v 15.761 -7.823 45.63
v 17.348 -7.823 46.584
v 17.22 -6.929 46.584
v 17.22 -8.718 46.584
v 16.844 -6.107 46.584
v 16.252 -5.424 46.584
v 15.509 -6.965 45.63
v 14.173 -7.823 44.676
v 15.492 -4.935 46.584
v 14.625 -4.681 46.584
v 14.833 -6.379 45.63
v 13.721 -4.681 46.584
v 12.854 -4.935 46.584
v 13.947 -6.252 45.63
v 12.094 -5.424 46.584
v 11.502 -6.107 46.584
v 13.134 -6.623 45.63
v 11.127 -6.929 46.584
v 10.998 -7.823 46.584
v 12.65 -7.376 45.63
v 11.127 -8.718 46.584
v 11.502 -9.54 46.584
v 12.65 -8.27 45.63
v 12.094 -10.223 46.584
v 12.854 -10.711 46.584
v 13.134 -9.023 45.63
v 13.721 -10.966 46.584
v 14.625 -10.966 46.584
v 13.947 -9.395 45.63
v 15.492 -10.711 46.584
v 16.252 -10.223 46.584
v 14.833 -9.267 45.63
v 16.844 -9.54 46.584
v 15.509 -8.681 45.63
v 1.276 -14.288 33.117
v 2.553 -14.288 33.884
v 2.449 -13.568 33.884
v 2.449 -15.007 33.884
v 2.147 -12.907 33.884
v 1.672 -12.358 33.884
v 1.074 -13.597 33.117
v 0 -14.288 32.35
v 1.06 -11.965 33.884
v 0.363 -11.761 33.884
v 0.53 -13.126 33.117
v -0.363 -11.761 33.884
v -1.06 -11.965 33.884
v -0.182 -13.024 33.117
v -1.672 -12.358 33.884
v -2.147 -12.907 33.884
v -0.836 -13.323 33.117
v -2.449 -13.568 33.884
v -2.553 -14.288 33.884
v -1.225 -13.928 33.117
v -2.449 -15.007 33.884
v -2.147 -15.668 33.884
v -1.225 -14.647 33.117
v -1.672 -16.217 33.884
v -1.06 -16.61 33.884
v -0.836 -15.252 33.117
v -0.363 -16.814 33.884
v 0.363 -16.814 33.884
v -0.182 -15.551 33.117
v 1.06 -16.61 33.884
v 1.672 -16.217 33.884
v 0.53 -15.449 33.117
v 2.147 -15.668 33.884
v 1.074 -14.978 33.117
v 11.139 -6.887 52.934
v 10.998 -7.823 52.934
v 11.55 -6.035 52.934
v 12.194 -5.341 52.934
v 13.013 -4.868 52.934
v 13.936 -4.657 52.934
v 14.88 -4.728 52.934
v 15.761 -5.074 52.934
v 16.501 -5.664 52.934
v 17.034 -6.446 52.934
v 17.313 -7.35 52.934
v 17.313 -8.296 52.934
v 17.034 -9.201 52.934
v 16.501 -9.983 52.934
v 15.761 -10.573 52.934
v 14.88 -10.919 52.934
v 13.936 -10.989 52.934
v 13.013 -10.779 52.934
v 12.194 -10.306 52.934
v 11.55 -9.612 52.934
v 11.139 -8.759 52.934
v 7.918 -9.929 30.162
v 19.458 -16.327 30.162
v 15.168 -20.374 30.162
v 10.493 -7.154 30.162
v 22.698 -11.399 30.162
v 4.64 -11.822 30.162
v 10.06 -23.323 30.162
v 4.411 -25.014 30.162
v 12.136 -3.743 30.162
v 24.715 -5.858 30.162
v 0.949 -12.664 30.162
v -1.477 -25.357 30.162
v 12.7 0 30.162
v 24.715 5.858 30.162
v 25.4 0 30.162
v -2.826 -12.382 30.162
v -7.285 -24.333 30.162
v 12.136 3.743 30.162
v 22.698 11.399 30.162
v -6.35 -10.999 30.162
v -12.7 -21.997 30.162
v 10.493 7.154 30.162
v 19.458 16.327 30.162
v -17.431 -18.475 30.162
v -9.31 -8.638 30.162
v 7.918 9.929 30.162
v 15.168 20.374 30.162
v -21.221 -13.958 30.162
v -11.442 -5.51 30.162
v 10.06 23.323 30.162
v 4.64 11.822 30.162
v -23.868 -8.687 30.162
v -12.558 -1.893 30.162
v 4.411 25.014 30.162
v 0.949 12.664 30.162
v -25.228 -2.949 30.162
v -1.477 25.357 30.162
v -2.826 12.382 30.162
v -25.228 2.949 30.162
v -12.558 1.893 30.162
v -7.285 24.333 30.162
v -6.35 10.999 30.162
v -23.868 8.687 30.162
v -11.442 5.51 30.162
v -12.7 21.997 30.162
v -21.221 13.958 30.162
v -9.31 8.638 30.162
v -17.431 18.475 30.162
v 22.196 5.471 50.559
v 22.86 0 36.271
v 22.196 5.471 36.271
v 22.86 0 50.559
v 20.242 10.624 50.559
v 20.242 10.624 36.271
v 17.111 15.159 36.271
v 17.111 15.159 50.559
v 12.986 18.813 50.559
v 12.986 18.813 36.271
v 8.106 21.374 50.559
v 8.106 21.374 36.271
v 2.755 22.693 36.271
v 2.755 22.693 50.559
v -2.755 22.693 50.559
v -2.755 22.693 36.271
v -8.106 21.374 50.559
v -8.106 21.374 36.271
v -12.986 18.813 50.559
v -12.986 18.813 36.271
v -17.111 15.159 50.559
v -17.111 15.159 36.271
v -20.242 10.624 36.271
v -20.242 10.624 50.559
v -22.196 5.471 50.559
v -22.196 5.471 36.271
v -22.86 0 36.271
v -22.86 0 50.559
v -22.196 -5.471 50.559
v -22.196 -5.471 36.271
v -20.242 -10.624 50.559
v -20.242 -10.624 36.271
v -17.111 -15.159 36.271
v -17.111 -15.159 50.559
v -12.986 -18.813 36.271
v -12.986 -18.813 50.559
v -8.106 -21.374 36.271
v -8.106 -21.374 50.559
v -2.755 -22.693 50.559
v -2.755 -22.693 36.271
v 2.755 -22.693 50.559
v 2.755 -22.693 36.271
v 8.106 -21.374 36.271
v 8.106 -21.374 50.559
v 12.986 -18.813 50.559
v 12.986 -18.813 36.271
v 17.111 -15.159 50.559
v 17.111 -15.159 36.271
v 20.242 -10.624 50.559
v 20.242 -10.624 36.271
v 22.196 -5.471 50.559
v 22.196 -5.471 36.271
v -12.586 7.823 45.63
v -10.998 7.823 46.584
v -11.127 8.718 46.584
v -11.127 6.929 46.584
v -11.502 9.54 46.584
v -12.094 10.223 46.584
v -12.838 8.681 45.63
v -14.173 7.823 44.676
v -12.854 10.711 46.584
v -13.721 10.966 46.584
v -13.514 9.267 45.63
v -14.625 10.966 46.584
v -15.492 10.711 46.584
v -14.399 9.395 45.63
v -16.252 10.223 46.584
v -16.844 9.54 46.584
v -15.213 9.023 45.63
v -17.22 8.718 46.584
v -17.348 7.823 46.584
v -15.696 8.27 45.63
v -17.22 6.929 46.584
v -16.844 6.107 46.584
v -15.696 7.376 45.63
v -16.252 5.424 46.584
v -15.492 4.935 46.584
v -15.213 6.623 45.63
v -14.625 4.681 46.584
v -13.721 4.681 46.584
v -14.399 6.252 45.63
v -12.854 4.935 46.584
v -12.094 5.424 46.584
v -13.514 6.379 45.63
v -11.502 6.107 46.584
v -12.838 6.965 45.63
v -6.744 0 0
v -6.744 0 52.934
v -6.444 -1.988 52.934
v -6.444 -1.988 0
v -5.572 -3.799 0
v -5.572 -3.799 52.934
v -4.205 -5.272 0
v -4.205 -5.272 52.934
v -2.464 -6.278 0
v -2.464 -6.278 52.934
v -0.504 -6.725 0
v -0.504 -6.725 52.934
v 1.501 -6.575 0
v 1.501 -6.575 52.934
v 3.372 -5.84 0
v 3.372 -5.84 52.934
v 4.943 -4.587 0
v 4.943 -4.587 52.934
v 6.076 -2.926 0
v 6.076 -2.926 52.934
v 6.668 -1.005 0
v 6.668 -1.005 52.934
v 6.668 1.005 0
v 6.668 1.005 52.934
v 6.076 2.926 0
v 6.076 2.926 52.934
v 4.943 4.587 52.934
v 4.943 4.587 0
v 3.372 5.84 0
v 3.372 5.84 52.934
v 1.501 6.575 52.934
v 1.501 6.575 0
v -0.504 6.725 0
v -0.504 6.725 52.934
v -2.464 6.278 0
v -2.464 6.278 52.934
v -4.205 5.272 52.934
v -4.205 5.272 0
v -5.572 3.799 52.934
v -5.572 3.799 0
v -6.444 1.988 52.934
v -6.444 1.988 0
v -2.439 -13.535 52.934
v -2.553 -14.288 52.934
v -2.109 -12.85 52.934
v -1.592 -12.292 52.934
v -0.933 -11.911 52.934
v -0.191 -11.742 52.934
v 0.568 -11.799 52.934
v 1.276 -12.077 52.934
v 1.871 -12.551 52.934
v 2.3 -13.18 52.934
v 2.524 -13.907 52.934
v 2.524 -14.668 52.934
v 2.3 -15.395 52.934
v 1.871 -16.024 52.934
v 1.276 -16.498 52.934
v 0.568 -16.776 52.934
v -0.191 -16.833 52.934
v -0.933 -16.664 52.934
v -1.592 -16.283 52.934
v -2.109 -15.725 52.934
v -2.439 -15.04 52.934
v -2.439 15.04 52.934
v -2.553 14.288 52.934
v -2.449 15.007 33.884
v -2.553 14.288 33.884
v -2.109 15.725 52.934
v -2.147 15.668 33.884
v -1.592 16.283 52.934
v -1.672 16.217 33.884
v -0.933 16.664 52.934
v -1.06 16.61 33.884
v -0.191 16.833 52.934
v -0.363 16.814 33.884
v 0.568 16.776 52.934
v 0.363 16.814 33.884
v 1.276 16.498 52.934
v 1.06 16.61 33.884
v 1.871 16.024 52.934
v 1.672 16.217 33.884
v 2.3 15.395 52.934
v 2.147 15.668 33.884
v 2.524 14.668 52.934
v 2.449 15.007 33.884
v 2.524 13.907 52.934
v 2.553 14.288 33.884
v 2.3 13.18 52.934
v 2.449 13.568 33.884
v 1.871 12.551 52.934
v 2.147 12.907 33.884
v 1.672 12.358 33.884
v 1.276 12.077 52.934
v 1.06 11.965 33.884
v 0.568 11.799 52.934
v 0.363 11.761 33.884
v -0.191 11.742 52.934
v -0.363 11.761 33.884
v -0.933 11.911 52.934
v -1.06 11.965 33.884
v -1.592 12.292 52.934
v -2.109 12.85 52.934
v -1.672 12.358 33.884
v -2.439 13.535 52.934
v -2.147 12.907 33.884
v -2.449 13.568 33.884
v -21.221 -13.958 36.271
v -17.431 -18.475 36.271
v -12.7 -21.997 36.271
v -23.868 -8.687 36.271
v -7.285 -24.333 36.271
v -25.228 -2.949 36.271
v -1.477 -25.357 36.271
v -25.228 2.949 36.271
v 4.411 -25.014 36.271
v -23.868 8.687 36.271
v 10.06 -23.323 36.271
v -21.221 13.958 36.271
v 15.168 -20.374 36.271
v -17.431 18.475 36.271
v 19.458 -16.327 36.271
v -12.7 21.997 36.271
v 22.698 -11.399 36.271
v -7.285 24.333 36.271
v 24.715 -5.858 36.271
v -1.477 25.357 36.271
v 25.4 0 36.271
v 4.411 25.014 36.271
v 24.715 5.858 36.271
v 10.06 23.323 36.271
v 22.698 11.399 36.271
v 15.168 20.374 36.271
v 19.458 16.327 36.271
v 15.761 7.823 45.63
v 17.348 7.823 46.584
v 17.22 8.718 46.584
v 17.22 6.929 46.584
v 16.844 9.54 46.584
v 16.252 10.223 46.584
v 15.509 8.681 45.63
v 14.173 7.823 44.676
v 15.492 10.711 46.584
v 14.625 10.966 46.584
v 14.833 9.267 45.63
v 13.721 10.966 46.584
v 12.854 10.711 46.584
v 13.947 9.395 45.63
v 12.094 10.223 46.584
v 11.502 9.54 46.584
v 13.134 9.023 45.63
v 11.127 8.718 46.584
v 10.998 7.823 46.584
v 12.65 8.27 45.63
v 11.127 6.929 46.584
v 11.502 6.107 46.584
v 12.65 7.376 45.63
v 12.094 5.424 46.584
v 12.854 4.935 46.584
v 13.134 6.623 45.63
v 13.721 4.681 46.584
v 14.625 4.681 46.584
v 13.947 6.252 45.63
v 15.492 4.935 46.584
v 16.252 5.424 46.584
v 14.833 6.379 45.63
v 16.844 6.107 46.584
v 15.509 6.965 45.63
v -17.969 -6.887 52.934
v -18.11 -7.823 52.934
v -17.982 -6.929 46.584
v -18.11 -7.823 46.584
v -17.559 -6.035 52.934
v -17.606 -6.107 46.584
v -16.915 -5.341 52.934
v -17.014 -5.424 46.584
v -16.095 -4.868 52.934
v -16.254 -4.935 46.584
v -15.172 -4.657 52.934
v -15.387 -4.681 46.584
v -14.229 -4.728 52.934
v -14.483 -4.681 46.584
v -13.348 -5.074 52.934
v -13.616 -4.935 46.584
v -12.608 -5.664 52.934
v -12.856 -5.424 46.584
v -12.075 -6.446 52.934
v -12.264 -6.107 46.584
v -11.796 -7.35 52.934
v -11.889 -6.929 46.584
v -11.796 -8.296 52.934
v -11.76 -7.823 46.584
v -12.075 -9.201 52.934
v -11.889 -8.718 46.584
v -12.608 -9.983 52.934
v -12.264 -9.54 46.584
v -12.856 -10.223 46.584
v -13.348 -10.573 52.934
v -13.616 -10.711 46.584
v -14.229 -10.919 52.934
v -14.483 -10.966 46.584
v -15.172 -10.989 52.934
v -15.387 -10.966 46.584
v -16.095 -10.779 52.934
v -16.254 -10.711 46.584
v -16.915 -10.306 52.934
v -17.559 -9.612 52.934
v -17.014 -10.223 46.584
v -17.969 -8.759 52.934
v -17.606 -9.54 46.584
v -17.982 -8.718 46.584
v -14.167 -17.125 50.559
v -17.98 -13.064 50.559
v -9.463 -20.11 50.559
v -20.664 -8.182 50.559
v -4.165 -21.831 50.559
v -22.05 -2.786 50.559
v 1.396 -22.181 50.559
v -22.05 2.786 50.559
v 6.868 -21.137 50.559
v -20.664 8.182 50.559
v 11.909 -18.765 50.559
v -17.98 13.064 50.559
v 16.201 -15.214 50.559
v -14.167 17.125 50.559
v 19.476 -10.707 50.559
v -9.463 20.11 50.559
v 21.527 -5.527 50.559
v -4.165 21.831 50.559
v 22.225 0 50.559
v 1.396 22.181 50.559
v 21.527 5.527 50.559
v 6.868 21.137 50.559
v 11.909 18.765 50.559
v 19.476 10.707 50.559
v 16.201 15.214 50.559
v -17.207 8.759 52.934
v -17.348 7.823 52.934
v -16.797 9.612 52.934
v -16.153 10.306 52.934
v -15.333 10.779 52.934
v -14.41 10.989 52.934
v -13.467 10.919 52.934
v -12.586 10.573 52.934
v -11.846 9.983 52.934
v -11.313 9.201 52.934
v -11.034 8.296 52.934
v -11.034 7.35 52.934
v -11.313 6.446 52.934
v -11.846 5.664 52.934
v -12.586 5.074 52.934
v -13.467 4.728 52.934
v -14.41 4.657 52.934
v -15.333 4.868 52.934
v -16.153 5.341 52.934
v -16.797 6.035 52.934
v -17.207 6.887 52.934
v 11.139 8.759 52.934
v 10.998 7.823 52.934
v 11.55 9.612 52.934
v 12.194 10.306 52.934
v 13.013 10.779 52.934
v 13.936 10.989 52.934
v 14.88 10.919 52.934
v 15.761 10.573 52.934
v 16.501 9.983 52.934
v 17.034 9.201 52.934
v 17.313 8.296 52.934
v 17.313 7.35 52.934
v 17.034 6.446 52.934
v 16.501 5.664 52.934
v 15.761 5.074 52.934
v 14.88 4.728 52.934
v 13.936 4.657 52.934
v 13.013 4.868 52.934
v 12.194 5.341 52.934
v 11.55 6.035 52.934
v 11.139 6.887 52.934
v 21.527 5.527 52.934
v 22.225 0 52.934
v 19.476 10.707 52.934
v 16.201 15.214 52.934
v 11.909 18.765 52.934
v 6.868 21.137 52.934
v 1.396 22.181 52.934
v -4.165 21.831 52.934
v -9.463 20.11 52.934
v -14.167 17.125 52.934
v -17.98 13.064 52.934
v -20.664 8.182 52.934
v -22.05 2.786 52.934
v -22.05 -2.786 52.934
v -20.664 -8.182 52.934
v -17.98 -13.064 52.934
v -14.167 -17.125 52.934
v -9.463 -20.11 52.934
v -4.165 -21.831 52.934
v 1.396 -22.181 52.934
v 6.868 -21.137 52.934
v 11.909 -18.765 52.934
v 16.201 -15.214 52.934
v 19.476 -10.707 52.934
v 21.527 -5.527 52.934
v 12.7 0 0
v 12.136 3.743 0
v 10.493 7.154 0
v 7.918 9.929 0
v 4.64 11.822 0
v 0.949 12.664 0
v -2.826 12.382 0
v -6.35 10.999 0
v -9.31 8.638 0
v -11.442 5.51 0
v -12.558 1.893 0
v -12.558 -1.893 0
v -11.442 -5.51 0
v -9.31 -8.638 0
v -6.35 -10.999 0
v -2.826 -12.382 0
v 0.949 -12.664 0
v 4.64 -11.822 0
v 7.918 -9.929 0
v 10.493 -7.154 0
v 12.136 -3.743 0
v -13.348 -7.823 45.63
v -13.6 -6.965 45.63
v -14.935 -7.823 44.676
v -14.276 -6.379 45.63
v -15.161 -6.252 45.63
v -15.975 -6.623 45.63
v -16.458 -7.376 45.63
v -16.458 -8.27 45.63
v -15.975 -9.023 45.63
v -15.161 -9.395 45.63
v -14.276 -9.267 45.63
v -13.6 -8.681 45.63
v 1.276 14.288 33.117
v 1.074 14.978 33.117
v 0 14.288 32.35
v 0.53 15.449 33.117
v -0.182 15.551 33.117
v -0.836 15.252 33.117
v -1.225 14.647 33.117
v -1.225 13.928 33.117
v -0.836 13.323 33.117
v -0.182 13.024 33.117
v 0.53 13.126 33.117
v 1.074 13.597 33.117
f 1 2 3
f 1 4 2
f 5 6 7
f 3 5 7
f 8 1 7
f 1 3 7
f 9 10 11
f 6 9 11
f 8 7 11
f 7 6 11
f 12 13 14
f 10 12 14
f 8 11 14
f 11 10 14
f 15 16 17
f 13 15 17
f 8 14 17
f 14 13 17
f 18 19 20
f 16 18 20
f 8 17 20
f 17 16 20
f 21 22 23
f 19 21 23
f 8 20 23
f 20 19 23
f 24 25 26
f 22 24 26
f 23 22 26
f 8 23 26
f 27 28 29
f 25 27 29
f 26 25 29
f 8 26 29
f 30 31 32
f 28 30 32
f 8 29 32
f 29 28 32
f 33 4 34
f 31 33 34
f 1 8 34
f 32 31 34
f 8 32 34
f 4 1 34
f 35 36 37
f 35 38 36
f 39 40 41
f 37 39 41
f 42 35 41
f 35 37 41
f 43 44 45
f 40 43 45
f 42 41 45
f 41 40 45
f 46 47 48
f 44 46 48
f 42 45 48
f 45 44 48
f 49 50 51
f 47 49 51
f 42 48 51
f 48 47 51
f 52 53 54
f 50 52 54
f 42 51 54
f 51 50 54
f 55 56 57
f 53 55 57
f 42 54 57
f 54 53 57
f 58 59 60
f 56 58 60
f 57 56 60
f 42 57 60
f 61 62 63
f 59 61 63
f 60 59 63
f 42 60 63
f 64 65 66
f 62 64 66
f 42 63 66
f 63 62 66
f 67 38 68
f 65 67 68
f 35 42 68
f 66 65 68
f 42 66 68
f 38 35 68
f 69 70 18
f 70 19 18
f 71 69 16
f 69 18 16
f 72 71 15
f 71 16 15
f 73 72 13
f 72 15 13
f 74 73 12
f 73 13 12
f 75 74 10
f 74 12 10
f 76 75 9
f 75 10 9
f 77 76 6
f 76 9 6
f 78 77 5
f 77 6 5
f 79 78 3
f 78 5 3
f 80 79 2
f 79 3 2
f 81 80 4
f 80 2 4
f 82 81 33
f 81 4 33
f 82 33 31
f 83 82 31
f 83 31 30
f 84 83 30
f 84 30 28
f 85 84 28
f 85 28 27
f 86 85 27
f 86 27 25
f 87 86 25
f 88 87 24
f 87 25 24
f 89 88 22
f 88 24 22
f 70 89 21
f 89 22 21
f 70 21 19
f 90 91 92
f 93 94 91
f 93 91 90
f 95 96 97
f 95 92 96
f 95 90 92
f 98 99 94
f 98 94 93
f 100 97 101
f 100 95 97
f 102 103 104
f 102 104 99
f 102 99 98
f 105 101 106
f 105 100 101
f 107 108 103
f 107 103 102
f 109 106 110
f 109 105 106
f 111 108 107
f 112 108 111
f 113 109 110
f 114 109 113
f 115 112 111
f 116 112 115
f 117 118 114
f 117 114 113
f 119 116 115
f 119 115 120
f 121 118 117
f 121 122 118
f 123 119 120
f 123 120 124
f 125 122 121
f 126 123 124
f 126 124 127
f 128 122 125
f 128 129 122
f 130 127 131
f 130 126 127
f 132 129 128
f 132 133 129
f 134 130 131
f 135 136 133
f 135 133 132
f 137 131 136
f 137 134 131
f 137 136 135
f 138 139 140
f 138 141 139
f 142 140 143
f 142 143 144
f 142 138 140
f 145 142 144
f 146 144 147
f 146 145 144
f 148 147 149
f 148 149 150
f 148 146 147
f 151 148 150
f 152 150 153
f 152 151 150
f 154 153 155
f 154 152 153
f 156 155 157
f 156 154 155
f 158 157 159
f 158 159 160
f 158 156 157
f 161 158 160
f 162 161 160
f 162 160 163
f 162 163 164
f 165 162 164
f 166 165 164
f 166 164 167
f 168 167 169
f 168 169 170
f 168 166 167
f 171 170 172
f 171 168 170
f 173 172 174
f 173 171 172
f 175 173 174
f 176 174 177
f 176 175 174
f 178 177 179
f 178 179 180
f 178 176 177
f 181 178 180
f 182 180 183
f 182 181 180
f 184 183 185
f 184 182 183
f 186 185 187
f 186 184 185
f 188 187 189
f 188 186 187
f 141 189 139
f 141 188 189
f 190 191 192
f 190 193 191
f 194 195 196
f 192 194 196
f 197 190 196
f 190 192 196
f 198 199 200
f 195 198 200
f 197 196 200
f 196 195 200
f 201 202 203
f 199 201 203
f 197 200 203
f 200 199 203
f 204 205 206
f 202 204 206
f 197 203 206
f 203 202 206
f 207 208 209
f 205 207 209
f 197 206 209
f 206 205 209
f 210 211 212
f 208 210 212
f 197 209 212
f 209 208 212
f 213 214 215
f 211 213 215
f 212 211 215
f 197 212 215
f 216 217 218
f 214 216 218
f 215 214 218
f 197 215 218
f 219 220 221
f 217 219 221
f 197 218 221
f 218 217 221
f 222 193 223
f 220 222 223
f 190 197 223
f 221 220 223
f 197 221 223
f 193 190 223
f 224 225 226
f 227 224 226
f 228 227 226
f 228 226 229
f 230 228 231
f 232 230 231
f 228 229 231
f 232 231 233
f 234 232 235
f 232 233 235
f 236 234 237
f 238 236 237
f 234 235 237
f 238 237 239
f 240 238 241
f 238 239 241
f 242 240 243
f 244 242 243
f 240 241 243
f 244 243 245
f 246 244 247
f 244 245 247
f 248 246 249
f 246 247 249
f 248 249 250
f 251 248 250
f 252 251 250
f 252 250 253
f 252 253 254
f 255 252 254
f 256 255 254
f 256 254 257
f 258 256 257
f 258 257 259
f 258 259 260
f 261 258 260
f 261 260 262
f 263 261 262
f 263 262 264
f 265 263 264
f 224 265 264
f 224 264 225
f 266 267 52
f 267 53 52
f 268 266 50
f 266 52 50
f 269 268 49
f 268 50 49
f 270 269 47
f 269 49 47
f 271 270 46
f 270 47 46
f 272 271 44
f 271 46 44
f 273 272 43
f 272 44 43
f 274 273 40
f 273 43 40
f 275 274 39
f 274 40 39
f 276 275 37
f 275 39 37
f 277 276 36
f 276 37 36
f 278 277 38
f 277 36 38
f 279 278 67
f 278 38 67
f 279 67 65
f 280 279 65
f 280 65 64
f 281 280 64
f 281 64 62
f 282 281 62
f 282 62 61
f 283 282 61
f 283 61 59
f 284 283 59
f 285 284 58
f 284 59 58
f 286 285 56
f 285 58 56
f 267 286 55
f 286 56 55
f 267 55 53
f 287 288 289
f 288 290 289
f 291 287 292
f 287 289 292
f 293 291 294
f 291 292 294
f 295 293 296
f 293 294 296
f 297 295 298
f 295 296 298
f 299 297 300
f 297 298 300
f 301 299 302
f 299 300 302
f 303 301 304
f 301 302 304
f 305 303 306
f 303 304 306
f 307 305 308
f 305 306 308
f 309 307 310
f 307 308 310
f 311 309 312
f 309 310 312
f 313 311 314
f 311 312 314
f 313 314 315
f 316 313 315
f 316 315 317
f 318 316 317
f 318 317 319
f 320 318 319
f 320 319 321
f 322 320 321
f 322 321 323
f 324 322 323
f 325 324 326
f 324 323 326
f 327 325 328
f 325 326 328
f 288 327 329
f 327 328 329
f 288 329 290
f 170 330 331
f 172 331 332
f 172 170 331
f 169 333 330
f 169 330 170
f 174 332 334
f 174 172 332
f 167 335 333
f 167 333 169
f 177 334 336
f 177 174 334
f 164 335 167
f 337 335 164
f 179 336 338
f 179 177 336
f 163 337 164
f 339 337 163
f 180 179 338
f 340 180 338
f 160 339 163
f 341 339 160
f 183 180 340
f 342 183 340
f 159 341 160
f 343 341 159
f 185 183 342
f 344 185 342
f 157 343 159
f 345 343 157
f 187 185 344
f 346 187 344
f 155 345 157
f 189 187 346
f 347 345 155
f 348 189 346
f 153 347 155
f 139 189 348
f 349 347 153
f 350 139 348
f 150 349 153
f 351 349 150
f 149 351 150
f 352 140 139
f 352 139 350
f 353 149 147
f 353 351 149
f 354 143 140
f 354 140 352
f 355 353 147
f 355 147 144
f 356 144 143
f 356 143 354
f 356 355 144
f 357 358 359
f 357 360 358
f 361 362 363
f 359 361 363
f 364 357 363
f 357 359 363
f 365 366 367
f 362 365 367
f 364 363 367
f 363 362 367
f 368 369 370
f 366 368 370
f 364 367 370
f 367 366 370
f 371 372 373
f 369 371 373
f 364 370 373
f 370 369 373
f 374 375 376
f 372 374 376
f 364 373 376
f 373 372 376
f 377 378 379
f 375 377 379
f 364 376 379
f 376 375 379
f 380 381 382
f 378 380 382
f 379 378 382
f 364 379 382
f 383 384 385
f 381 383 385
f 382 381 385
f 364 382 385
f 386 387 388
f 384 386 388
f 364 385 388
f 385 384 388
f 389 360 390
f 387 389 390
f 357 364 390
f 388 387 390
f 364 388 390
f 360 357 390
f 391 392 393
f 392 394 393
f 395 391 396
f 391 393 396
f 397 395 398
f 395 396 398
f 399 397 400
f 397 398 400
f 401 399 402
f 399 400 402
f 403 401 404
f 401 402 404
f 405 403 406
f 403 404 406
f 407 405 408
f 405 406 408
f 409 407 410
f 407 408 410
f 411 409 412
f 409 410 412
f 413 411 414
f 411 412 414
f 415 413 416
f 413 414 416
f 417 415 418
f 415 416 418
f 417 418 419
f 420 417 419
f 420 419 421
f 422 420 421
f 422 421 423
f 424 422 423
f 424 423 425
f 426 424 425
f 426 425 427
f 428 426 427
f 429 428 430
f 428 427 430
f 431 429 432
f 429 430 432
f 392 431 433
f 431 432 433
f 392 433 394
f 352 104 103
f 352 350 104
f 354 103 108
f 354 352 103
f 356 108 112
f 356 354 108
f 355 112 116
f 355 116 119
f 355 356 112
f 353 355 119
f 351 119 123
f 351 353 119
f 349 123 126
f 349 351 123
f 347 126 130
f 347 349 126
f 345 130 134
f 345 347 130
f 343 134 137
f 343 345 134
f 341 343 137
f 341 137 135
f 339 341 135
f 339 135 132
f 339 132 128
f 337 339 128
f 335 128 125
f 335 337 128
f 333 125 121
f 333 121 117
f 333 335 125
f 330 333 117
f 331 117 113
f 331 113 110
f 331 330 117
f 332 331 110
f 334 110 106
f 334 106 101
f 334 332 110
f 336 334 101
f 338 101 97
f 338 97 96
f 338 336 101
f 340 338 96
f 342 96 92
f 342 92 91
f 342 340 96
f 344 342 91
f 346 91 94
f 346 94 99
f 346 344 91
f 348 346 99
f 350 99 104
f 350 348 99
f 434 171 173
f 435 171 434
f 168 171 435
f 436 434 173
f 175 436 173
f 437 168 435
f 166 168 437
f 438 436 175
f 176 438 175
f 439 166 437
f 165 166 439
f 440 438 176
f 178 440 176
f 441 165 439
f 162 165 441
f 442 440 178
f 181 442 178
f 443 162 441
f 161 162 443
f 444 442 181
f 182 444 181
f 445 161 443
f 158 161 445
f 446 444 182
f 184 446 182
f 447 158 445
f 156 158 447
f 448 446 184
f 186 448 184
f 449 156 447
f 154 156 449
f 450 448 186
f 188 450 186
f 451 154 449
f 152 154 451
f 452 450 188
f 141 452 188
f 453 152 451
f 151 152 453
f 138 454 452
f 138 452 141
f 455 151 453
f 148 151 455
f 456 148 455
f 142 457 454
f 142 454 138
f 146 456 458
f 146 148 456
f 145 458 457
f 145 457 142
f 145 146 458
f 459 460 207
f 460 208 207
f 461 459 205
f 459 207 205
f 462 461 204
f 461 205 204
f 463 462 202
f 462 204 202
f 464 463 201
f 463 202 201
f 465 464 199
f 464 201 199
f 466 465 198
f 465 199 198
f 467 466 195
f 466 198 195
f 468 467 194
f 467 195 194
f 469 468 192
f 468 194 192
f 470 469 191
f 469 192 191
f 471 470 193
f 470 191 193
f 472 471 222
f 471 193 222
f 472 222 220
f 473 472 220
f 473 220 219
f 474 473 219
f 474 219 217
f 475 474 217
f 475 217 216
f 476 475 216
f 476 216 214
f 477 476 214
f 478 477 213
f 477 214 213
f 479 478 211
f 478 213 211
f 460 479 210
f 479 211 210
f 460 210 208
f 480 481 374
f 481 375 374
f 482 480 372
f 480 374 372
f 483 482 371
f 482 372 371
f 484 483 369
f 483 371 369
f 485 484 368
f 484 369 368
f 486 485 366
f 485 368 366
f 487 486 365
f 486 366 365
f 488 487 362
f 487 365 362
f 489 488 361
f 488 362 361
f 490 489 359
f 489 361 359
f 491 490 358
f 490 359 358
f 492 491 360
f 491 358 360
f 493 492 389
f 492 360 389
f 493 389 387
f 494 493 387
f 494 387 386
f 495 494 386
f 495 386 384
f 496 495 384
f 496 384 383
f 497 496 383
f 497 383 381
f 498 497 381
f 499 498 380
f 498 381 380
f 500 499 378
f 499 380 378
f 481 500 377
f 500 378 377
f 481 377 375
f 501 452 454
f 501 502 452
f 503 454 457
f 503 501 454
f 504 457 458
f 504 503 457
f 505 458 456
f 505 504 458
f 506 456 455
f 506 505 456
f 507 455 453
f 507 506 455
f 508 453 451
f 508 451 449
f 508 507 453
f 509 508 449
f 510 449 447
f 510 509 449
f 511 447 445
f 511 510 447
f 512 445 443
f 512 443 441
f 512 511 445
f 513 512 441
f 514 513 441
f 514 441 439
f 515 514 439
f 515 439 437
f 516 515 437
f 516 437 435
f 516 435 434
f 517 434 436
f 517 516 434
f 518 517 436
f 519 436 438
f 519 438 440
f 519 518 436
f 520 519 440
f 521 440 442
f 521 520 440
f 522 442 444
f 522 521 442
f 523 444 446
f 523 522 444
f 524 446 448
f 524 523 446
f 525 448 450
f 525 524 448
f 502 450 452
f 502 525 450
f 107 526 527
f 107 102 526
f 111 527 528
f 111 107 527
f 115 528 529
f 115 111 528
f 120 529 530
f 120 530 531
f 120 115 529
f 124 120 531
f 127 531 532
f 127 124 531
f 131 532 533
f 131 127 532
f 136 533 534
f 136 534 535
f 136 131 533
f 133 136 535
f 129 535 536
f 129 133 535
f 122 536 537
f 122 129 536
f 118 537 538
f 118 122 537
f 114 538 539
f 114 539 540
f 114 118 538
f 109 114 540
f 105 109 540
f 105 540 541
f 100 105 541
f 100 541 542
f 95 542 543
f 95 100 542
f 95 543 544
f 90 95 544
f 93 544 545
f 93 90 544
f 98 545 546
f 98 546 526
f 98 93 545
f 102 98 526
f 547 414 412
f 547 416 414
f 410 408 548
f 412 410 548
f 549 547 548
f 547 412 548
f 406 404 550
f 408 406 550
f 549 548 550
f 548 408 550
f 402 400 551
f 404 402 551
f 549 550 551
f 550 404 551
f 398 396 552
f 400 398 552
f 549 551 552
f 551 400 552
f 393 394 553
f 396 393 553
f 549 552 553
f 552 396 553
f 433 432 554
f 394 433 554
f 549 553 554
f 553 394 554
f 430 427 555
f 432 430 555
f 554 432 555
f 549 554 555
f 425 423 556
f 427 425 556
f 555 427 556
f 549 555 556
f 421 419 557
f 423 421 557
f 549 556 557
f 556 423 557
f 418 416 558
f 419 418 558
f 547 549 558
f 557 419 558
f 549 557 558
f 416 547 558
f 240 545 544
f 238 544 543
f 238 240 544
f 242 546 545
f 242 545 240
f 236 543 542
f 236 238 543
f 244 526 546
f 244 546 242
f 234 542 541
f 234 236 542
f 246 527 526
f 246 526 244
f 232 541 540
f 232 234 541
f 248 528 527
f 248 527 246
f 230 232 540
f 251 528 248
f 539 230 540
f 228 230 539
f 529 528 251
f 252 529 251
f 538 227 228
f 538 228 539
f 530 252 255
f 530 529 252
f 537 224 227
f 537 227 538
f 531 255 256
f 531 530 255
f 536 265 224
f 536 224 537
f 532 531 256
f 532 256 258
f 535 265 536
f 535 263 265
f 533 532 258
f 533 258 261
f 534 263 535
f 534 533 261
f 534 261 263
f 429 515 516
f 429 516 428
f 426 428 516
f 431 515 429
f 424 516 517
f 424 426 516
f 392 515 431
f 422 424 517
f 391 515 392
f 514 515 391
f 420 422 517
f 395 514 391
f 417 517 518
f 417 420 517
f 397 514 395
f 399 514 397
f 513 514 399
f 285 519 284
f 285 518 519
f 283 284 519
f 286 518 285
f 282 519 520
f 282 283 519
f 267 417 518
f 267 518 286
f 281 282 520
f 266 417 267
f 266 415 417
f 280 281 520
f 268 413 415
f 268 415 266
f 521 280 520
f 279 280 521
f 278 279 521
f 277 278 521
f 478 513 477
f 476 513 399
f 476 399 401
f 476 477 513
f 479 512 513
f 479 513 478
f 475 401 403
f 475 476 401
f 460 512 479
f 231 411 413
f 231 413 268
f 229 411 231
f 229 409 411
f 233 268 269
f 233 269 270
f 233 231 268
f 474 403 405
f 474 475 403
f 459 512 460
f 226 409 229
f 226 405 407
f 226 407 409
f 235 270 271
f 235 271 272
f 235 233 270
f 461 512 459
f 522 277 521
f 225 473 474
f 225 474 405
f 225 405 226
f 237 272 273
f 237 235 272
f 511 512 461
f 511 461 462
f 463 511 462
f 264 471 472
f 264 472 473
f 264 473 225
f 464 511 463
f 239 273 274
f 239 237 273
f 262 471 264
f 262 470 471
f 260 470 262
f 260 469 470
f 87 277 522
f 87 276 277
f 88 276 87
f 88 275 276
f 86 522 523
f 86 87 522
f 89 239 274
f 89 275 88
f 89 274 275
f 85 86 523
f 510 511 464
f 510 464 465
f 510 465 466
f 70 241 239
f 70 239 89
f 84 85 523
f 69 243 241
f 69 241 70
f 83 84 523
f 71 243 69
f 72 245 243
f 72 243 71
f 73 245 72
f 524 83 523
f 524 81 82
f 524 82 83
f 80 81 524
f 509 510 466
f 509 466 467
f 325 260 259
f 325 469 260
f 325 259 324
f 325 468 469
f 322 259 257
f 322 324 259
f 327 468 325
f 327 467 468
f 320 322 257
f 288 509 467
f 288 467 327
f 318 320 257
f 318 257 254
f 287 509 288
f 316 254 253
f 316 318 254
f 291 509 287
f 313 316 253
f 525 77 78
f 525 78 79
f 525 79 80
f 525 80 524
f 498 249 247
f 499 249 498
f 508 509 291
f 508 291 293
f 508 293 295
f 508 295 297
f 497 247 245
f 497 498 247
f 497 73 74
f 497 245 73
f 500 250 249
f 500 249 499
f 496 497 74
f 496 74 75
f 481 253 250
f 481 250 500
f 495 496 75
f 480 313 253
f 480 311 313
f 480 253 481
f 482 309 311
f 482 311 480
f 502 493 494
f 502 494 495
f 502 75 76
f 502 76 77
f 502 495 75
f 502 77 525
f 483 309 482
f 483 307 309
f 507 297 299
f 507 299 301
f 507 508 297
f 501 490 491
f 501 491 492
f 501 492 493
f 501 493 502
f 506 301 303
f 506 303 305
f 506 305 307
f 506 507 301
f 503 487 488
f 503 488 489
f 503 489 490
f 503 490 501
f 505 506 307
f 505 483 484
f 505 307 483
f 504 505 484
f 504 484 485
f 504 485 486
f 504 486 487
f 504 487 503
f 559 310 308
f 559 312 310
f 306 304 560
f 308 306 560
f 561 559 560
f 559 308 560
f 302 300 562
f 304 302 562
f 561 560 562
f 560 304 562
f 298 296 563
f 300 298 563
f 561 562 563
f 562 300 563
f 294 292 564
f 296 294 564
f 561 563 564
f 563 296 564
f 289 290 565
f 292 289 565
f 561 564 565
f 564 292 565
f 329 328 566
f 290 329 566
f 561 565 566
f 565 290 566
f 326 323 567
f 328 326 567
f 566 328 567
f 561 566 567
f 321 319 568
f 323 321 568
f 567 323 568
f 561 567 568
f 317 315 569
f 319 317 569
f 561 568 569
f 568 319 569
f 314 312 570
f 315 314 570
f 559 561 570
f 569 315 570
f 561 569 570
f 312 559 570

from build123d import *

# Parameters (mm, degrees)
F3_D      = 13.4874
F6_D      = 6.35
F6_DEPTH  = 6.35
F6_TIP    = 1.9077324654
F8_D      = 6.35
F8_DEPTH  = 6.35
F8_TIP    = 1.9077324654
F10_D     = 5.1054
F10_DEPTH = 19.05
F10_TIP   = 1.5338169022


with BuildPart() as f1:
    # F0 (on Front) → F1 (revolve)
    with BuildSketch(Plane.XZ):
        Polygon((0, 52.9336), (0, 0), (12.7, 0), (12.7, 30.1625), (25.4, 30.1625), (25.4, 36.2712), (22.86, 36.2712), (22.86, 50.5587), (22.225, 50.5587), (22.225, 52.9336), align=None)
    revolve(axis=Axis((0, 0, 26.4668), (0, 0, 1)))

    # F3 (through all)
    with Locations(Plane(origin=(0, 0, 0), x_dir=(1, 0, 0), z_dir=(0, 0, -1))):
        with Locations((0, 0)):
            Hole(F3_D / 2)

    # F6
    with Locations(Plane.XY.offset(52.9336)):
        with Locations((-14.1732, 7.8232), (14.1732, 7.8232)):
            Hole(F6_D / 2, depth=F6_DEPTH)
            with Locations((0, 0, -(F6_DEPTH + F6_TIP / 2))):  # 118° drill point
                Cone(0, F6_D / 2, F6_TIP, mode=Mode.SUBTRACT)

    # F8
    with Locations(Plane.XY.offset(52.9336)):
        with Locations((-14.9352, -7.8232), (14.1732, -7.8232)):
            Hole(F8_D / 2, depth=F8_DEPTH)
            with Locations((0, 0, -(F8_DEPTH + F8_TIP / 2))):  # 118° drill point
                Cone(0, F8_D / 2, F8_TIP, mode=Mode.SUBTRACT)

    # F10
    with Locations(Plane.XY.offset(52.9336)):
        with Locations((0, -14.2875), (0, 14.2875)):
            Hole(F10_D / 2, depth=F10_DEPTH)
            with Locations((0, 0, -(F10_DEPTH + F10_TIP / 2))):  # 118° drill point
                Cone(0, F10_D / 2, F10_TIP, mode=Mode.SUBTRACT)


solid = f1.part
